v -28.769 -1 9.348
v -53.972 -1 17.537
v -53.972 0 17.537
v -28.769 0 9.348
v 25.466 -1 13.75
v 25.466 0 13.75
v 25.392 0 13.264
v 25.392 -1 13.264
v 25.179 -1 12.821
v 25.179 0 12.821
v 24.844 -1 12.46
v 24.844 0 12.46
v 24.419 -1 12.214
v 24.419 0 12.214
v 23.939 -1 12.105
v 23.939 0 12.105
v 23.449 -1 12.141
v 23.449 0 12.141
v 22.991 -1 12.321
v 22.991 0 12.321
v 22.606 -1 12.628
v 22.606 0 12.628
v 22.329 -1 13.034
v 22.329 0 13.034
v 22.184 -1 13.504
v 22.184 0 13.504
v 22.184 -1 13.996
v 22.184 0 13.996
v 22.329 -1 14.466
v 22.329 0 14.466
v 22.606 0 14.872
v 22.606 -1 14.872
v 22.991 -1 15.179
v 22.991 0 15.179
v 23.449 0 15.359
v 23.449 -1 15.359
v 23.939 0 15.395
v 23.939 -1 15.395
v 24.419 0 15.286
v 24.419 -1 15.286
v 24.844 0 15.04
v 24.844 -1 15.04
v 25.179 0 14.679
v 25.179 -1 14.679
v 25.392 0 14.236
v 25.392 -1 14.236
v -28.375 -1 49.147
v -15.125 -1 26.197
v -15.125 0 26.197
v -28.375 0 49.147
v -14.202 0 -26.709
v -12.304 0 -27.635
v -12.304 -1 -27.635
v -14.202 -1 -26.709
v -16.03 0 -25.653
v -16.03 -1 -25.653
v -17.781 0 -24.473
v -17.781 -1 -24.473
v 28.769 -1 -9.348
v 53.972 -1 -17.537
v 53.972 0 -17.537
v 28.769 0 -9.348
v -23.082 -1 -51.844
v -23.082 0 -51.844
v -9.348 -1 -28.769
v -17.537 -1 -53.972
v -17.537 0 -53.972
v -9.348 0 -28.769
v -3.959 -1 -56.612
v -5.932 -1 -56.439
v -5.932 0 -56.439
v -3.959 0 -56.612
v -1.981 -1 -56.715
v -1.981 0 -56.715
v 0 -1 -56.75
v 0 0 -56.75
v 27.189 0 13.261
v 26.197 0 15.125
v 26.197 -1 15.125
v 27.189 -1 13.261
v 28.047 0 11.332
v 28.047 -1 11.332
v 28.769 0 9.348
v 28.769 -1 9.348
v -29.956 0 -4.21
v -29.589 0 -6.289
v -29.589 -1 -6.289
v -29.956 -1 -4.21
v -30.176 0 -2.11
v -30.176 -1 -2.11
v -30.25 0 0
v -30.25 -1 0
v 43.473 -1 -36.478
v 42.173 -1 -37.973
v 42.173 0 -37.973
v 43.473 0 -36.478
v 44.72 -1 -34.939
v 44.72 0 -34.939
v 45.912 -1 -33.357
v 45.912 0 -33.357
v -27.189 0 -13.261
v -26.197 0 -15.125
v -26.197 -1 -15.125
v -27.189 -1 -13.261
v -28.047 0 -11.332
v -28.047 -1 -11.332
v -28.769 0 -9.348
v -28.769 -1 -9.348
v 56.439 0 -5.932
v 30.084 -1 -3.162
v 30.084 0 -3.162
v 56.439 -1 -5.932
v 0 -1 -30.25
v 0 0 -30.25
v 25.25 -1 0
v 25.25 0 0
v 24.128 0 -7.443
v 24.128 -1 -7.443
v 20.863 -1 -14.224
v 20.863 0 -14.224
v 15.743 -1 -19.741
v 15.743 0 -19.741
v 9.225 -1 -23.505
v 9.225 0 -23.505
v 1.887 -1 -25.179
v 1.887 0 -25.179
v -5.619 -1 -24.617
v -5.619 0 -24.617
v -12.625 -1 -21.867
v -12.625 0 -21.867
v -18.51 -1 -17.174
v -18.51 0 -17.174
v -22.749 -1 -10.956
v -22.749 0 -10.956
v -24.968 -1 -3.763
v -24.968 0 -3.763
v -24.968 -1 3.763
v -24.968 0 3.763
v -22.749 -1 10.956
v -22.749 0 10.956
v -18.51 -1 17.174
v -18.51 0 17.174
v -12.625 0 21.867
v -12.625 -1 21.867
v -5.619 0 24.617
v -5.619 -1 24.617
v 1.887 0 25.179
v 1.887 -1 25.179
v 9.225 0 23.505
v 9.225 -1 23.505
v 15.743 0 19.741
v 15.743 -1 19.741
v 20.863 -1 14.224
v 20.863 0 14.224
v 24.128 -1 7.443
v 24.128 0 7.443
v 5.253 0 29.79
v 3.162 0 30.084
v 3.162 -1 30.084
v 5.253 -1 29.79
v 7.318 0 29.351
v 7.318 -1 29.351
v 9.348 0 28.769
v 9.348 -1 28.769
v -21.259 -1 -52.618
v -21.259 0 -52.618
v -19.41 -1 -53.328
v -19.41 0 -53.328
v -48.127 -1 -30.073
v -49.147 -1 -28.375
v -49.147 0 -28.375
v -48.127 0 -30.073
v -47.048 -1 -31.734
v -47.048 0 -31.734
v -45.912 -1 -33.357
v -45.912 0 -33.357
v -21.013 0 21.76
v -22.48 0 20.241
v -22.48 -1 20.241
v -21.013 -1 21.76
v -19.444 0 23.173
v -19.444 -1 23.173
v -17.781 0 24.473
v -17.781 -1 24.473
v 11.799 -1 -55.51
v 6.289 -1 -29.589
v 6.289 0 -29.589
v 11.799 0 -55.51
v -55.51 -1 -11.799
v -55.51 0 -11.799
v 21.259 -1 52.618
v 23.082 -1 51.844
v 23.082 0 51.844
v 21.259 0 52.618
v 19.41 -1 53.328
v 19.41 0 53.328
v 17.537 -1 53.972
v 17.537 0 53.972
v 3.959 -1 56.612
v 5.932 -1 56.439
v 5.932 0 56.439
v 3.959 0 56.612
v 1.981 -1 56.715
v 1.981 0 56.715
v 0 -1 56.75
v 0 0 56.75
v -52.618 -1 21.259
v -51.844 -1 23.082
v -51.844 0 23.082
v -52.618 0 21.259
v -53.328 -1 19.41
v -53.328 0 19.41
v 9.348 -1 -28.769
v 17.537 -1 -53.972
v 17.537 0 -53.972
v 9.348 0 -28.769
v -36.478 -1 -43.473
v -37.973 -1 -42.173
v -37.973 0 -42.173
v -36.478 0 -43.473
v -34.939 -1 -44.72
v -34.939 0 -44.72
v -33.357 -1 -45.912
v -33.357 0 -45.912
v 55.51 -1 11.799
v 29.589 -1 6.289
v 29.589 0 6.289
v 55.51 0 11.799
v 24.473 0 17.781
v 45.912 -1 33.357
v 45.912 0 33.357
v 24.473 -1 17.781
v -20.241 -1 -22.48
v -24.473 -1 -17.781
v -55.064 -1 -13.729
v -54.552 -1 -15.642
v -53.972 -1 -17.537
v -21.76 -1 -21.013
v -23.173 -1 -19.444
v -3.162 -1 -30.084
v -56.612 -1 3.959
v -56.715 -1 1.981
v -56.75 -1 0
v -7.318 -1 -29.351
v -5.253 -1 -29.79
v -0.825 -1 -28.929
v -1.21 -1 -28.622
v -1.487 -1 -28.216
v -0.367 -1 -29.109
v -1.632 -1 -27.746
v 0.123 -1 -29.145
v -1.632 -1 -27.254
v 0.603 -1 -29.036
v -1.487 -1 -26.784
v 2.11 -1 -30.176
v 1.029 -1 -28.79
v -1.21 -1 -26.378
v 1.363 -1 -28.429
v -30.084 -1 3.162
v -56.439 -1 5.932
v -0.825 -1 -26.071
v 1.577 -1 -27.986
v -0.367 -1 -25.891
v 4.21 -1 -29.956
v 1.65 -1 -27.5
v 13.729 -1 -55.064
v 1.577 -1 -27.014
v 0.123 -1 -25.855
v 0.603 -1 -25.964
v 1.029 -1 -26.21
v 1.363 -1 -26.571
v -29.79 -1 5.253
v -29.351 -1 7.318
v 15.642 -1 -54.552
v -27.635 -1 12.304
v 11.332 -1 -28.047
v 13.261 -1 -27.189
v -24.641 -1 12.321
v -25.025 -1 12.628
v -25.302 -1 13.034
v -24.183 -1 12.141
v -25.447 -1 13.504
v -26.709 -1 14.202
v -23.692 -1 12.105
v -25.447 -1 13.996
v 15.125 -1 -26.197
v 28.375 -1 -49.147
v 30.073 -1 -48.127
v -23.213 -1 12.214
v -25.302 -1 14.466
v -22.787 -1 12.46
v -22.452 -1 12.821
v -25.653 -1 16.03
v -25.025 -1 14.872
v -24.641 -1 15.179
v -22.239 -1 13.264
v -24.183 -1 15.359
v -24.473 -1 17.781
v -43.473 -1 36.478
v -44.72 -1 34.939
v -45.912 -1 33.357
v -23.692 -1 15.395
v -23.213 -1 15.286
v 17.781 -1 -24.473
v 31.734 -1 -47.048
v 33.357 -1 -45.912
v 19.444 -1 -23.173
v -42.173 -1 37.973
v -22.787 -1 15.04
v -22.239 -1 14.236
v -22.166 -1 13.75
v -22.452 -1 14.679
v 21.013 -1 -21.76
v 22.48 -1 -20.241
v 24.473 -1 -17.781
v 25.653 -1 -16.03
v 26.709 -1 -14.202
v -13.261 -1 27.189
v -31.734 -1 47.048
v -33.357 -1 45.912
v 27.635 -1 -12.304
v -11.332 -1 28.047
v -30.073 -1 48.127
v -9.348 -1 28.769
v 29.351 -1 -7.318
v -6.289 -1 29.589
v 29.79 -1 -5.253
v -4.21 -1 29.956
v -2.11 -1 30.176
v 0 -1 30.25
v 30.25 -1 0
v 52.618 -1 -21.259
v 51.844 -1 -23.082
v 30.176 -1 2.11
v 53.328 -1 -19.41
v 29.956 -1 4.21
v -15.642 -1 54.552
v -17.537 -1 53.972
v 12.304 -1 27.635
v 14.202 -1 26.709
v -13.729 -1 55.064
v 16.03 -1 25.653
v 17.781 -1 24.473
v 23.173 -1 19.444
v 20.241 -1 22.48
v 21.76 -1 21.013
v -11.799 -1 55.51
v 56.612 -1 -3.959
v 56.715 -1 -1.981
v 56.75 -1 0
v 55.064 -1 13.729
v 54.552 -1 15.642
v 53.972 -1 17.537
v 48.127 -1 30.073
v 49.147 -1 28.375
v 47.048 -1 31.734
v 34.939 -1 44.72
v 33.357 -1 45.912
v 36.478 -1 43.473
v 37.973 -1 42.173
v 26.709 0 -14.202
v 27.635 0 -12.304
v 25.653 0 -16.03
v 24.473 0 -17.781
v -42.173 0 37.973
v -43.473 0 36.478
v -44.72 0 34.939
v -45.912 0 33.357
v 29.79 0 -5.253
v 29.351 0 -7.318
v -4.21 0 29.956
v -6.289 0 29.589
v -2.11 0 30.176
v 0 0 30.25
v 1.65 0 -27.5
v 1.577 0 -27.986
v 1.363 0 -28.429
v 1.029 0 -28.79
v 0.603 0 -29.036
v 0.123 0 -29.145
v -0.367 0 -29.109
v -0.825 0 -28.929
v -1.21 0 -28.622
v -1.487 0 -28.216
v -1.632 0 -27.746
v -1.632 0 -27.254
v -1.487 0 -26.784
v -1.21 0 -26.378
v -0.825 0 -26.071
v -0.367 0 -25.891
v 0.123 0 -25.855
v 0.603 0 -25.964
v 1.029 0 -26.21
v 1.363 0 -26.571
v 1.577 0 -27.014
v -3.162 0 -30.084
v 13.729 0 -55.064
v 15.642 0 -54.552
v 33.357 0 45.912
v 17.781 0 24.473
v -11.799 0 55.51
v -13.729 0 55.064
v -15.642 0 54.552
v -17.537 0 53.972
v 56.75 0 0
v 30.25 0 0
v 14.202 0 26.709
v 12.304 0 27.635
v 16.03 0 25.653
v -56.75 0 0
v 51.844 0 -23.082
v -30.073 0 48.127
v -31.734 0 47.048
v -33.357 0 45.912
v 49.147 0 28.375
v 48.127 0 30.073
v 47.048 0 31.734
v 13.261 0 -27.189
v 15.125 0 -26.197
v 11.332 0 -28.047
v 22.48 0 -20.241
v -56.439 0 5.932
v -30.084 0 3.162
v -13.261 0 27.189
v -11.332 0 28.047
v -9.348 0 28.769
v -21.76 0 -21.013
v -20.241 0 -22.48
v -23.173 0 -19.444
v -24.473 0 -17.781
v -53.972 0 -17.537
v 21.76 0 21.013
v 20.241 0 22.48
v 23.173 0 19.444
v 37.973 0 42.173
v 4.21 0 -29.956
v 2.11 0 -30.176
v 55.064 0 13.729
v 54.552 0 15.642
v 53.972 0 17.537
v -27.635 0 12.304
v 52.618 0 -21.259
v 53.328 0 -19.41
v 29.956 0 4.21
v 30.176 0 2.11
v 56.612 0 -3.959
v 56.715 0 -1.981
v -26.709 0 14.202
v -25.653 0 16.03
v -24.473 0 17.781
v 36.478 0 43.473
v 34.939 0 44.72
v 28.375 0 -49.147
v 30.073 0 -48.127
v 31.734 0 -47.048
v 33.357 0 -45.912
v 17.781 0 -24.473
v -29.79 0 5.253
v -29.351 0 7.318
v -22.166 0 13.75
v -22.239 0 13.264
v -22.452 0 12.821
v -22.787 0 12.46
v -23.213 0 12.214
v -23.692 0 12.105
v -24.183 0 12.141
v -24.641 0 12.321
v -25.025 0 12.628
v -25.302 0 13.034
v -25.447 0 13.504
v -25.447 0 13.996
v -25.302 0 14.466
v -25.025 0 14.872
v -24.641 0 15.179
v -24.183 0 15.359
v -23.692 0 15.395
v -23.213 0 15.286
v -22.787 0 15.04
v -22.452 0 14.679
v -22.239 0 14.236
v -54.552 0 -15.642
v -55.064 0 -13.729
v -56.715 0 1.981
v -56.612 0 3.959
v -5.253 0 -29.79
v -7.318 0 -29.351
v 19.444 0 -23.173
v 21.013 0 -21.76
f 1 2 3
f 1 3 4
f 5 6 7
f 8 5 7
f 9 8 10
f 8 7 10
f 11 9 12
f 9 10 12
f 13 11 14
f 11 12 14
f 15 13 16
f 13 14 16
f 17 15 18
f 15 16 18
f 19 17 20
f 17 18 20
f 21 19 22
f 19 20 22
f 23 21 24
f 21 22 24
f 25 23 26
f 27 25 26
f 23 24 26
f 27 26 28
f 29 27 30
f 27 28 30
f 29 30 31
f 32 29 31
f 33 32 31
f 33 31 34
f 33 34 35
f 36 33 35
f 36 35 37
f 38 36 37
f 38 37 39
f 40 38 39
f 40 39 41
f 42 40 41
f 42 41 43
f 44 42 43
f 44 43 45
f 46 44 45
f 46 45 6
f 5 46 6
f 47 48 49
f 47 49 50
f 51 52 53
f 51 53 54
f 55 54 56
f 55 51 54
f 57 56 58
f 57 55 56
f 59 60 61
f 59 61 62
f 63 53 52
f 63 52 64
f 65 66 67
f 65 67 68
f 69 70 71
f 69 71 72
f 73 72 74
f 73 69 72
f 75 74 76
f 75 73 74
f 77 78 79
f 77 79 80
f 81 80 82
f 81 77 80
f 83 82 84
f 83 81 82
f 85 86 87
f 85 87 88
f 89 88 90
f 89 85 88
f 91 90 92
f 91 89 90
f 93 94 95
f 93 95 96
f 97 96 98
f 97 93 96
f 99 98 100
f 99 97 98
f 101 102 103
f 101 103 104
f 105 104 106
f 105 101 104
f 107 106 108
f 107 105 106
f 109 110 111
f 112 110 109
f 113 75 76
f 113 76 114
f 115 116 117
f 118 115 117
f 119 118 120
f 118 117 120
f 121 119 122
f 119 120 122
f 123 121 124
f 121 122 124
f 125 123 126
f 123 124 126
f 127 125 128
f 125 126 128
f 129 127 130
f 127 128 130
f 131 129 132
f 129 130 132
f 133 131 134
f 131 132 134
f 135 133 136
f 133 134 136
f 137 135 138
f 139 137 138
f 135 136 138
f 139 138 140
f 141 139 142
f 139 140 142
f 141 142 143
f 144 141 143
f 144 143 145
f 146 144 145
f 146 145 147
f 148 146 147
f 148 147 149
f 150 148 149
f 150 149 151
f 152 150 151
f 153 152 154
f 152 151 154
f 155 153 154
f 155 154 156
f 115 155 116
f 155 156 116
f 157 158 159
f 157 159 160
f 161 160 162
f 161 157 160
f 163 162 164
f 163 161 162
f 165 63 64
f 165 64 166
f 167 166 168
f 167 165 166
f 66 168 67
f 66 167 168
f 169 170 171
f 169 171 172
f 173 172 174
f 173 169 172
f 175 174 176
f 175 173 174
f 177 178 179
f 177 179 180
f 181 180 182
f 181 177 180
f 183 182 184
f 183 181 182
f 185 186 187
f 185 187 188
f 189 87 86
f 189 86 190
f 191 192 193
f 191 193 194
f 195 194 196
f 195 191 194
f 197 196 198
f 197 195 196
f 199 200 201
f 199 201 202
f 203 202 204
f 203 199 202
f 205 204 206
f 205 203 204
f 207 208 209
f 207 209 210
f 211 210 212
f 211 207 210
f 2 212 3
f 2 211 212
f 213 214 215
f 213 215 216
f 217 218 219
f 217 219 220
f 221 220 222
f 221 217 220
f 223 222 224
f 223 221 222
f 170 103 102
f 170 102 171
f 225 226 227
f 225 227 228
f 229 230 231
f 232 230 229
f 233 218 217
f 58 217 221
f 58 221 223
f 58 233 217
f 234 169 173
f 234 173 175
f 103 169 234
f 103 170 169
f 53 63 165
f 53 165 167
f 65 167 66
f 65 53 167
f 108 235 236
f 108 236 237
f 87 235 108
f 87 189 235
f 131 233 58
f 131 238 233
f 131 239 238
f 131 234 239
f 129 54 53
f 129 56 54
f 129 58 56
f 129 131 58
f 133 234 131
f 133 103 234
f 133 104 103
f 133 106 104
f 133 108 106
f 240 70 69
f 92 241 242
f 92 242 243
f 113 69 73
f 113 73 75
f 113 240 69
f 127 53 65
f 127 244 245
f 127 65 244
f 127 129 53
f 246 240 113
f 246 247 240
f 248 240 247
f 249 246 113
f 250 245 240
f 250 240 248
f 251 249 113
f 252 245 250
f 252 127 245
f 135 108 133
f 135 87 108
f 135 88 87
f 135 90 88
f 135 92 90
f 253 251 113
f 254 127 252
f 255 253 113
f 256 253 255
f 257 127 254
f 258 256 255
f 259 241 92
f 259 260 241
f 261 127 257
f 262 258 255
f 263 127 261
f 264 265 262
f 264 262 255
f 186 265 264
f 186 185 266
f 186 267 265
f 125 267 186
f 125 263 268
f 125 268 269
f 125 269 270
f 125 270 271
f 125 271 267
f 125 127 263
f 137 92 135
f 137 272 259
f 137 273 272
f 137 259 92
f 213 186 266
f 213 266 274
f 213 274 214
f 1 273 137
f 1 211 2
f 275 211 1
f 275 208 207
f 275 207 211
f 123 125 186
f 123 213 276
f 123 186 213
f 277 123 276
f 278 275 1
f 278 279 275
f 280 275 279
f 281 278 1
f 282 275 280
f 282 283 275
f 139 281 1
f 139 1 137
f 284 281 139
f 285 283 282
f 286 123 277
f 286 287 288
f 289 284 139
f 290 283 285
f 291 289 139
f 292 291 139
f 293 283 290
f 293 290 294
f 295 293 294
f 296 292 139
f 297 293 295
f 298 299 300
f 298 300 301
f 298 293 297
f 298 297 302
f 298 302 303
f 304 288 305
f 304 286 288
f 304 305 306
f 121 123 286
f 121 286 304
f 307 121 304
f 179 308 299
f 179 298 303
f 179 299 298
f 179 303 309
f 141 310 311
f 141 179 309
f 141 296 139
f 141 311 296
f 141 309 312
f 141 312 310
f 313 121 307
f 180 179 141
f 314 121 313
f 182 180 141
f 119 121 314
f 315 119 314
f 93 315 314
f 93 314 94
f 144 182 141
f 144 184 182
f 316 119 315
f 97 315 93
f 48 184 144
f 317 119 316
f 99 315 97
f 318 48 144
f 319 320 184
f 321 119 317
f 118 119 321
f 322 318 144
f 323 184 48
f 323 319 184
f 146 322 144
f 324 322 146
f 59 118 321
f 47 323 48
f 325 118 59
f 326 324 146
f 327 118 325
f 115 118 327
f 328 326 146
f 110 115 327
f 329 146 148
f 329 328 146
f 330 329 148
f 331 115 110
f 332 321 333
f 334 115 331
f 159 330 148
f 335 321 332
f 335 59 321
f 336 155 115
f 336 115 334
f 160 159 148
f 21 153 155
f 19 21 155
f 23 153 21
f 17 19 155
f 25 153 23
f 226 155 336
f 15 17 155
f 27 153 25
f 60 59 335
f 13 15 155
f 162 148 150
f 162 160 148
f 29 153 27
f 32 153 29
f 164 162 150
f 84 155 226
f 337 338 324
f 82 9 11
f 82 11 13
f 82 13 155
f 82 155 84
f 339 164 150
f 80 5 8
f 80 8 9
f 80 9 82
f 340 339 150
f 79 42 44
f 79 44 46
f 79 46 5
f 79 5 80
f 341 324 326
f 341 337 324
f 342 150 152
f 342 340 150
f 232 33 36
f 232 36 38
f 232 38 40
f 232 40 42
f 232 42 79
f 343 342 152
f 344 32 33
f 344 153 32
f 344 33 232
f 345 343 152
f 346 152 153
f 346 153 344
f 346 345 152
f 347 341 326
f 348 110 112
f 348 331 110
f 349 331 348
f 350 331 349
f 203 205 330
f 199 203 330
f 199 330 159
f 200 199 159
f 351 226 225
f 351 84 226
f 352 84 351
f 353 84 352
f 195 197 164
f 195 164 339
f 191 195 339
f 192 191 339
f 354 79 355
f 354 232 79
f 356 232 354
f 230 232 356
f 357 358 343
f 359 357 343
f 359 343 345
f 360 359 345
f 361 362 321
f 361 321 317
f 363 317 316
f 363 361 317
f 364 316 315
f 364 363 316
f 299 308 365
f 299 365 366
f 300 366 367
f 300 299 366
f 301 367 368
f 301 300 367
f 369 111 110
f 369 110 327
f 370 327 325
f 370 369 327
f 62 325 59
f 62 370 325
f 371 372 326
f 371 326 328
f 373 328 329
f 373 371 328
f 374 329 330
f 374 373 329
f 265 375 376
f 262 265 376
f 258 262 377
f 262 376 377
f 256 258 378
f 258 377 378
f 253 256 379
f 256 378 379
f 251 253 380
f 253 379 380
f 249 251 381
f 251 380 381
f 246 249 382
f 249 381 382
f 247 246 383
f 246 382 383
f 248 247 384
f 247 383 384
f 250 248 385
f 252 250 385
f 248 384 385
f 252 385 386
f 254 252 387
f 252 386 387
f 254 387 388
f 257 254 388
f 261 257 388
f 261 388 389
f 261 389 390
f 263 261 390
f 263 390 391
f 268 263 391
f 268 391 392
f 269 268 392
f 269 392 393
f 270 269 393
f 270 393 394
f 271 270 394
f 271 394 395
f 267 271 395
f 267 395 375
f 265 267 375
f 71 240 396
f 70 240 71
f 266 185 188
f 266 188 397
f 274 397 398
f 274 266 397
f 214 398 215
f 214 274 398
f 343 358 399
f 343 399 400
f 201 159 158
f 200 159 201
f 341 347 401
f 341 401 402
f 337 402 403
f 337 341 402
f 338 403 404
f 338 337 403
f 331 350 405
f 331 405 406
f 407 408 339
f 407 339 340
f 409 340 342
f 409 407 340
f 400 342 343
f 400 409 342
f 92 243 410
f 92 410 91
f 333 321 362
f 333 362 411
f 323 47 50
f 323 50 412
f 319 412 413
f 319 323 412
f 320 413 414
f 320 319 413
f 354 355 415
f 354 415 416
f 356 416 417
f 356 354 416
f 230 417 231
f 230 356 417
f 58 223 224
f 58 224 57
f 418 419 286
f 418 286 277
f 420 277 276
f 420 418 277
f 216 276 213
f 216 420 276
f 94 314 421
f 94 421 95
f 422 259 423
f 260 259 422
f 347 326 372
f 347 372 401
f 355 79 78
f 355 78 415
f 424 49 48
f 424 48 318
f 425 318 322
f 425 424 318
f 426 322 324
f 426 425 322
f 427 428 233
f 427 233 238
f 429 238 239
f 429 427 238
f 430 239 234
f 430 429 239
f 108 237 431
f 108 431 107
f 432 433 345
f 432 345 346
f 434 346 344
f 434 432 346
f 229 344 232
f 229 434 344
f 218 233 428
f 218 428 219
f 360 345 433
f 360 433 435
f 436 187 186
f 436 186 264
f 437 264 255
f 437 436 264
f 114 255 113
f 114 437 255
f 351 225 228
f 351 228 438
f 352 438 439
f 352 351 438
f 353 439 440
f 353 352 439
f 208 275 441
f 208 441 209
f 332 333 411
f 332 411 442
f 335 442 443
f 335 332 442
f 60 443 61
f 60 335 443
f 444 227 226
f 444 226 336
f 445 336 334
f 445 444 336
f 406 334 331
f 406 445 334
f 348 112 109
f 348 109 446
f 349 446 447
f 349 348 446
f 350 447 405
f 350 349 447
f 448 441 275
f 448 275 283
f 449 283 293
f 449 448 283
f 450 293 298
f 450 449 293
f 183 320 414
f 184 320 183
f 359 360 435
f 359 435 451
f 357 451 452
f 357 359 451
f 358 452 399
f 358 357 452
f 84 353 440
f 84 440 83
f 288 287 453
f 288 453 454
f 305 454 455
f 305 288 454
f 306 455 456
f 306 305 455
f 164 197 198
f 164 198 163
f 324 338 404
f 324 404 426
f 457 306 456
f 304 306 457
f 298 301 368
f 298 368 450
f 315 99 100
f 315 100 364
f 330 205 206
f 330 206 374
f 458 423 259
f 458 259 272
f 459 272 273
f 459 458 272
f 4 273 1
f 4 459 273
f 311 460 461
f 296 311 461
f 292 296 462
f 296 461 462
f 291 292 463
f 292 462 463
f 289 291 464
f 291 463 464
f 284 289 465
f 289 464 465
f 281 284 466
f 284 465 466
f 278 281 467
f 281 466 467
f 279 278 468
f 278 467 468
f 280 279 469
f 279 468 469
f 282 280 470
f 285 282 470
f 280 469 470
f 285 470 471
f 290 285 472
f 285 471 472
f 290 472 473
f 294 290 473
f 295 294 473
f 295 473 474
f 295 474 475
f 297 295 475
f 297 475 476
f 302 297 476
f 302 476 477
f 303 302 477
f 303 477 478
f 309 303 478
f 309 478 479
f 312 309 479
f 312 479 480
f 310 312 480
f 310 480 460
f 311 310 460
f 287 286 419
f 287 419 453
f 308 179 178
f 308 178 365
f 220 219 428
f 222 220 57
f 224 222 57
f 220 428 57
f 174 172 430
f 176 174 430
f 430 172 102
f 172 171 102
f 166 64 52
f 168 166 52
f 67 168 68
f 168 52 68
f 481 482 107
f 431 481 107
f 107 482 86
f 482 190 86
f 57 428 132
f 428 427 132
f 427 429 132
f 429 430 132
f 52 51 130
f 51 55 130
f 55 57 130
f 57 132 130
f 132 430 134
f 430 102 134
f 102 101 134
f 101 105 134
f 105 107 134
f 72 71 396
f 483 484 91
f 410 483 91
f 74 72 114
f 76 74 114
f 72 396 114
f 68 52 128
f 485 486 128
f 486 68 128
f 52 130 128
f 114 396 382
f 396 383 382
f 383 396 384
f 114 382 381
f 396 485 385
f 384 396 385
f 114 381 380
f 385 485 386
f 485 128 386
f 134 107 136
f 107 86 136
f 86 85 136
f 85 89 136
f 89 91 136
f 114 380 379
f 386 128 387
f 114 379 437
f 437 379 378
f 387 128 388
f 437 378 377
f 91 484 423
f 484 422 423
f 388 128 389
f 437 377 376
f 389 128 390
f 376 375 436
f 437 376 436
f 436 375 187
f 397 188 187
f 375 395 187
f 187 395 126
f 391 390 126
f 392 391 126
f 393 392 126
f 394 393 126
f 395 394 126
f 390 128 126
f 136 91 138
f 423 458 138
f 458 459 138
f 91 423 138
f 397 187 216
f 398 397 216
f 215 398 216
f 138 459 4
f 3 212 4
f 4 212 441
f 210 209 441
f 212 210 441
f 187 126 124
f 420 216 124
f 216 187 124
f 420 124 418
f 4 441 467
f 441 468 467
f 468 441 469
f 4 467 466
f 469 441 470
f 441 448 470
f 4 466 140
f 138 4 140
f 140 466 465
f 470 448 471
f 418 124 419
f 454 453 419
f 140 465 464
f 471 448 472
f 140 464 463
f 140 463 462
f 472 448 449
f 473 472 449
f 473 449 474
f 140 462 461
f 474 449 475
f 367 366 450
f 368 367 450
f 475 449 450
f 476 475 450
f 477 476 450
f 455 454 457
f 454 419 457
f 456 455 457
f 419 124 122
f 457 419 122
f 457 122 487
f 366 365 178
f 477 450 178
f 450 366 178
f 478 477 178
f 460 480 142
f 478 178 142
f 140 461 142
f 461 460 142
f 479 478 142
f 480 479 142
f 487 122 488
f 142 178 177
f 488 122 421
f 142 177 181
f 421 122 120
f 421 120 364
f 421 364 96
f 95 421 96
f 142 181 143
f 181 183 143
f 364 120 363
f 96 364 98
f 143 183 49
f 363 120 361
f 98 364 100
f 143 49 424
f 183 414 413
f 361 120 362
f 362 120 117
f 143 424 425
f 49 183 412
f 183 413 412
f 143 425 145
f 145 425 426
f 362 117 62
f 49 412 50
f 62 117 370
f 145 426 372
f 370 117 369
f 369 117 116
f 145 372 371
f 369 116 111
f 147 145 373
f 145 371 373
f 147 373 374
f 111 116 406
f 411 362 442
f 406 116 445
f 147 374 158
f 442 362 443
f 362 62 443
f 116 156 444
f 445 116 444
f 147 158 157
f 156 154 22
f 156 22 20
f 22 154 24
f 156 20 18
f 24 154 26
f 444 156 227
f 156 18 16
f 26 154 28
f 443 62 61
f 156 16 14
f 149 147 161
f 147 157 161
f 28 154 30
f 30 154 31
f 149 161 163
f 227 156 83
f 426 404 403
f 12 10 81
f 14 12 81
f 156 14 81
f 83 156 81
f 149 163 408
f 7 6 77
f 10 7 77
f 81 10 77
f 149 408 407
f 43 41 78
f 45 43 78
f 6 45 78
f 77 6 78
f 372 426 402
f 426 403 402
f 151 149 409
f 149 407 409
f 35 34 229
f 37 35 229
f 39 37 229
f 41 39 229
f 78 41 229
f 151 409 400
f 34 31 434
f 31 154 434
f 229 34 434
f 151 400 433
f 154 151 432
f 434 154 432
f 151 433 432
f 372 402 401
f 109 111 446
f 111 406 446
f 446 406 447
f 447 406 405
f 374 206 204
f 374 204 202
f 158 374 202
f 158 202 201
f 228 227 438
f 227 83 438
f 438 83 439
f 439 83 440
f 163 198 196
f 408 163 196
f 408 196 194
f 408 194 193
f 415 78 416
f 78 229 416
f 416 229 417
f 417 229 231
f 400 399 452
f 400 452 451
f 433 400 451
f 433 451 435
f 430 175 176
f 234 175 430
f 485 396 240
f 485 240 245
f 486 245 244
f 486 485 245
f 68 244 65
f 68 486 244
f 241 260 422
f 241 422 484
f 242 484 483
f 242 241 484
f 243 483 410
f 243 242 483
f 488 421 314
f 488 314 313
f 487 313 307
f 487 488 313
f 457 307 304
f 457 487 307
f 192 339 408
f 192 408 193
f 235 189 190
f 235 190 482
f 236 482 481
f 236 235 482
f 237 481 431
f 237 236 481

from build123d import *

# Parameters (mm, degrees)
SKETCH1_R           = 30.25
SKETCH1_R_2         = 25.25
EXTRUDE_THIN1_DEPTH = 1
SKETCH2_R           = 1.65
CUT_EXTRUDE3_DEPTH  = 10
BOSS_EXTRUDE1_DEPTH = 1


with BuildPart() as part:
    # Sketch1 → Extrude-Thin1 (new body)
    with BuildSketch(Plane(origin=(0, 0, 0), x_dir=(1, 0, 0), z_dir=(0, 1, 0))):
        Circle(SKETCH1_R)
        Circle(SKETCH1_R_2, mode=Mode.SUBTRACT)
    extrude(amount=-EXTRUDE_THIN1_DEPTH)

    # Sketch2 → Cut-Extrude3 (cut)
    with BuildSketch(Plane(origin=(0, 0, 0), x_dir=(1, 0, 0), z_dir=(0, 1, 0))):
        with Locations((0, 27.5)):
            Circle(SKETCH2_R)
        with Locations((23.815698604, -13.75)):
            Circle(SKETCH2_R)
        with Locations((-23.815698604, -13.75)):
            Circle(SKETCH2_R)
    extrude(amount=-CUT_EXTRUDE3_DEPTH, mode=Mode.SUBTRACT)

    # Sketch5 → Boss-Extrude1 (add)
    with BuildSketch(Plane.XZ.offset(1)):
        with BuildLine():
            Line((0, 56.75), (0, 30.25))
            ThreePointArc((0, 30.25), (1.583162676, 30.208543426), (3.161986014, 30.084287335))
            Line((3.161986014, 30.084287335), (5.93199029, 56.439117562))
            ThreePointArc((5.93199029, 56.439117562), (2.970065517, 56.672226097), (0, 56.75))
        make_face()
        with BuildLine():
            Line((17.536714431, 53.9724573), (9.34776408, 28.769459618))
            ThreePointArc((9.34776408, 28.769459618), (10.840630474, 28.240807902), (12.303783453, 27.634750094))
            Line((12.303783453, 27.634750094), (23.082304495, 51.843704721))
            ThreePointArc((23.082304495, 51.843704721), (20.337381137, 52.980689204), (17.536714431, 53.9724573))
        make_face()
        with BuildLine():
            Line((33.356813068, 45.911714431), (17.780503882, 24.47276408))
            ThreePointArc((17.780503882, 24.47276408), (19.036941829, 23.508665334), (20.241200842, 22.480130971))
            Line((20.241200842, 22.480130971), (37.973161911, 42.173468846))
            ThreePointArc((37.973161911, 42.173468846), (35.713932192, 44.103033313), (33.356813068, 45.911714431))
        make_face()
        with BuildLine():
            Line((45.911714431, 33.356813068), (24.47276408, 17.780503882))
            ThreePointArc((24.47276408, 17.780503882), (25.36978468, 16.475330809), (26.197268464, 15.125))
            Line((26.197268464, 15.125), (49.146941665, 28.375))
            ThreePointArc((49.146941665, 28.375), (47.594554731, 30.908265237), (45.911714431, 33.356813068))
        make_face()
        with BuildLine():
            Line((53.9724573, 17.536714431), (28.769459618, 9.34776408))
            ThreePointArc((28.769459618, 9.34776408), (29.219256245, 7.829276114), (29.588964922, 6.289328647))
            Line((29.588964922, 6.289328647), (55.509876342, 11.798988454))
            ThreePointArc((55.509876342, 11.798988454), (54.816290642, 14.68798081), (53.9724573, 17.536714431))
        make_face()
        with BuildLine():
            Line((56.75, 0), (30.25, 0))
            ThreePointArc((30.25, 0), (30.208543426, -1.583162676), (30.084287335, -3.161986014))
            Line((30.084287335, -3.161986014), (56.439117562, -5.93199029))
            ThreePointArc((56.439117562, -5.93199029), (56.672226097, -2.970065517), (56.75, 0))
        make_face()
        with BuildLine():
            Line((53.9724573, -17.536714431), (28.769459618, -9.34776408))
            ThreePointArc((28.769459618, -9.34776408), (28.240807902, -10.840630474), (27.634750094, -12.303783453))
            Line((27.634750094, -12.303783453), (51.843704721, -23.082304495))
            ThreePointArc((51.843704721, -23.082304495), (52.980689204, -20.337381137), (53.9724573, -17.536714431))
        make_face()
        with BuildLine():
            Line((45.911714431, -33.356813068), (24.47276408, -17.780503882))
            ThreePointArc((24.47276408, -17.780503882), (23.508665334, -19.036941829), (22.480130971, -20.241200842))
            Line((22.480130971, -20.241200842), (42.173468846, -37.973161911))
            ThreePointArc((42.173468846, -37.973161911), (44.103033313, -35.713932192), (45.911714431, -33.356813068))
        make_face()
        with BuildLine():
            Line((33.356813068, -45.911714431), (17.780503882, -24.47276408))
            ThreePointArc((17.780503882, -24.47276408), (16.475330809, -25.36978468), (15.125, -26.197268464))
            Line((15.125, -26.197268464), (28.375, -49.146941665))
            ThreePointArc((28.375, -49.146941665), (30.908265237, -47.594554731), (33.356813068, -45.911714431))
        make_face()
        with BuildLine():
            Line((17.536714431, -53.9724573), (9.34776408, -28.769459618))
            ThreePointArc((9.34776408, -28.769459618), (7.829276114, -29.219256245), (6.289328647, -29.588964922))
            Line((6.289328647, -29.588964922), (11.798988454, -55.509876342))
            ThreePointArc((11.798988454, -55.509876342), (14.68798081, -54.816290642), (17.536714431, -53.9724573))
        make_face()
        with BuildLine():
            Line((0, -56.75), (0, -30.25))
            ThreePointArc((0, -30.25), (-1.583162676, -30.208543426), (-3.161986014, -30.084287335))
            Line((-3.161986014, -30.084287335), (-5.93199029, -56.439117562))
            ThreePointArc((-5.93199029, -56.439117562), (-2.970065517, -56.672226097), (0, -56.75))
        make_face()
        with BuildLine():
            Line((-17.536714431, -53.9724573), (-9.34776408, -28.769459618))
            ThreePointArc((-9.34776408, -28.769459618), (-10.840630474, -28.240807902), (-12.303783453, -27.634750094))
            Line((-12.303783453, -27.634750094), (-23.082304495, -51.843704721))
            ThreePointArc((-23.082304495, -51.843704721), (-20.337381137, -52.980689204), (-17.536714431, -53.9724573))
        make_face()
        with BuildLine():
            Line((-33.356813068, -45.911714431), (-17.780503882, -24.47276408))
            ThreePointArc((-17.780503882, -24.47276408), (-19.036941829, -23.508665334), (-20.241200842, -22.480130971))
            Line((-20.241200842, -22.480130971), (-37.973161911, -42.173468846))
            ThreePointArc((-37.973161911, -42.173468846), (-35.713932192, -44.103033313), (-33.356813068, -45.911714431))
        make_face()
        with BuildLine():
            Line((-45.911714431, -33.356813068), (-24.47276408, -17.780503882))
            ThreePointArc((-24.47276408, -17.780503882), (-25.36978468, -16.475330809), (-26.197268464, -15.125))
            Line((-26.197268464, -15.125), (-49.146941665, -28.375))
            ThreePointArc((-49.146941665, -28.375), (-47.594554731, -30.908265237), (-45.911714431, -33.356813068))
        make_face()
        with BuildLine():
            Line((-53.9724573, -17.536714431), (-28.769459618, -9.34776408))
            ThreePointArc((-28.769459618, -9.34776408), (-29.219256245, -7.829276114), (-29.588964922, -6.289328647))
            Line((-29.588964922, -6.289328647), (-55.509876342, -11.798988454))
            ThreePointArc((-55.509876342, -11.798988454), (-54.816290642, -14.68798081), (-53.9724573, -17.536714431))
        make_face()
        with BuildLine():
            Line((-56.75, 0), (-30.25, 0))
            ThreePointArc((-30.25, 0), (-30.208543426, 1.583162676), (-30.084287335, 3.161986014))
            Line((-30.084287335, 3.161986014), (-56.439117562, 5.93199029))
            ThreePointArc((-56.439117562, 5.93199029), (-56.672226097, 2.970065517), (-56.75, 0))
        make_face()
        with BuildLine():
            Line((-53.9724573, 17.536714431), (-28.769459618, 9.34776408))
            ThreePointArc((-28.769459618, 9.34776408), (-28.240807902, 10.840630474), (-27.634750094, 12.303783453))
            Line((-27.634750094, 12.303783453), (-51.843704721, 23.082304495))
            ThreePointArc((-51.843704721, 23.082304495), (-52.980689204, 20.337381137), (-53.9724573, 17.536714431))
        make_face()
        with BuildLine():
            Line((-45.911714431, 33.356813068), (-24.47276408, 17.780503882))
            ThreePointArc((-24.47276408, 17.780503882), (-23.508665334, 19.036941829), (-22.480130971, 20.241200842))
            Line((-22.480130971, 20.241200842), (-42.173468846, 37.973161911))
            ThreePointArc((-42.173468846, 37.973161911), (-44.103033313, 35.713932192), (-45.911714431, 33.356813068))
        make_face()
        with BuildLine():
            Line((-33.356813068, 45.911714431), (-17.780503882, 24.47276408))
            ThreePointArc((-17.780503882, 24.47276408), (-16.475330809, 25.36978468), (-15.125, 26.197268464))
            Line((-15.125, 26.197268464), (-28.375, 49.146941665))
            ThreePointArc((-28.375, 49.146941665), (-30.908265237, 47.594554731), (-33.356813068, 45.911714431))
        make_face()
        with BuildLine():
            Line((-17.536714431, 53.9724573), (-9.34776408, 28.769459618))
            ThreePointArc((-9.34776408, 28.769459618), (-7.829276114, 29.219256245), (-6.289328647, 29.588964922))
            Line((-6.289328647, 29.588964922), (-11.798988454, 55.509876342))
            ThreePointArc((-11.798988454, 55.509876342), (-14.68798081, 54.816290642), (-17.536714431, 53.9724573))
        make_face()
    extrude(amount=-BOSS_EXTRUDE1_DEPTH)


solid = part.part
